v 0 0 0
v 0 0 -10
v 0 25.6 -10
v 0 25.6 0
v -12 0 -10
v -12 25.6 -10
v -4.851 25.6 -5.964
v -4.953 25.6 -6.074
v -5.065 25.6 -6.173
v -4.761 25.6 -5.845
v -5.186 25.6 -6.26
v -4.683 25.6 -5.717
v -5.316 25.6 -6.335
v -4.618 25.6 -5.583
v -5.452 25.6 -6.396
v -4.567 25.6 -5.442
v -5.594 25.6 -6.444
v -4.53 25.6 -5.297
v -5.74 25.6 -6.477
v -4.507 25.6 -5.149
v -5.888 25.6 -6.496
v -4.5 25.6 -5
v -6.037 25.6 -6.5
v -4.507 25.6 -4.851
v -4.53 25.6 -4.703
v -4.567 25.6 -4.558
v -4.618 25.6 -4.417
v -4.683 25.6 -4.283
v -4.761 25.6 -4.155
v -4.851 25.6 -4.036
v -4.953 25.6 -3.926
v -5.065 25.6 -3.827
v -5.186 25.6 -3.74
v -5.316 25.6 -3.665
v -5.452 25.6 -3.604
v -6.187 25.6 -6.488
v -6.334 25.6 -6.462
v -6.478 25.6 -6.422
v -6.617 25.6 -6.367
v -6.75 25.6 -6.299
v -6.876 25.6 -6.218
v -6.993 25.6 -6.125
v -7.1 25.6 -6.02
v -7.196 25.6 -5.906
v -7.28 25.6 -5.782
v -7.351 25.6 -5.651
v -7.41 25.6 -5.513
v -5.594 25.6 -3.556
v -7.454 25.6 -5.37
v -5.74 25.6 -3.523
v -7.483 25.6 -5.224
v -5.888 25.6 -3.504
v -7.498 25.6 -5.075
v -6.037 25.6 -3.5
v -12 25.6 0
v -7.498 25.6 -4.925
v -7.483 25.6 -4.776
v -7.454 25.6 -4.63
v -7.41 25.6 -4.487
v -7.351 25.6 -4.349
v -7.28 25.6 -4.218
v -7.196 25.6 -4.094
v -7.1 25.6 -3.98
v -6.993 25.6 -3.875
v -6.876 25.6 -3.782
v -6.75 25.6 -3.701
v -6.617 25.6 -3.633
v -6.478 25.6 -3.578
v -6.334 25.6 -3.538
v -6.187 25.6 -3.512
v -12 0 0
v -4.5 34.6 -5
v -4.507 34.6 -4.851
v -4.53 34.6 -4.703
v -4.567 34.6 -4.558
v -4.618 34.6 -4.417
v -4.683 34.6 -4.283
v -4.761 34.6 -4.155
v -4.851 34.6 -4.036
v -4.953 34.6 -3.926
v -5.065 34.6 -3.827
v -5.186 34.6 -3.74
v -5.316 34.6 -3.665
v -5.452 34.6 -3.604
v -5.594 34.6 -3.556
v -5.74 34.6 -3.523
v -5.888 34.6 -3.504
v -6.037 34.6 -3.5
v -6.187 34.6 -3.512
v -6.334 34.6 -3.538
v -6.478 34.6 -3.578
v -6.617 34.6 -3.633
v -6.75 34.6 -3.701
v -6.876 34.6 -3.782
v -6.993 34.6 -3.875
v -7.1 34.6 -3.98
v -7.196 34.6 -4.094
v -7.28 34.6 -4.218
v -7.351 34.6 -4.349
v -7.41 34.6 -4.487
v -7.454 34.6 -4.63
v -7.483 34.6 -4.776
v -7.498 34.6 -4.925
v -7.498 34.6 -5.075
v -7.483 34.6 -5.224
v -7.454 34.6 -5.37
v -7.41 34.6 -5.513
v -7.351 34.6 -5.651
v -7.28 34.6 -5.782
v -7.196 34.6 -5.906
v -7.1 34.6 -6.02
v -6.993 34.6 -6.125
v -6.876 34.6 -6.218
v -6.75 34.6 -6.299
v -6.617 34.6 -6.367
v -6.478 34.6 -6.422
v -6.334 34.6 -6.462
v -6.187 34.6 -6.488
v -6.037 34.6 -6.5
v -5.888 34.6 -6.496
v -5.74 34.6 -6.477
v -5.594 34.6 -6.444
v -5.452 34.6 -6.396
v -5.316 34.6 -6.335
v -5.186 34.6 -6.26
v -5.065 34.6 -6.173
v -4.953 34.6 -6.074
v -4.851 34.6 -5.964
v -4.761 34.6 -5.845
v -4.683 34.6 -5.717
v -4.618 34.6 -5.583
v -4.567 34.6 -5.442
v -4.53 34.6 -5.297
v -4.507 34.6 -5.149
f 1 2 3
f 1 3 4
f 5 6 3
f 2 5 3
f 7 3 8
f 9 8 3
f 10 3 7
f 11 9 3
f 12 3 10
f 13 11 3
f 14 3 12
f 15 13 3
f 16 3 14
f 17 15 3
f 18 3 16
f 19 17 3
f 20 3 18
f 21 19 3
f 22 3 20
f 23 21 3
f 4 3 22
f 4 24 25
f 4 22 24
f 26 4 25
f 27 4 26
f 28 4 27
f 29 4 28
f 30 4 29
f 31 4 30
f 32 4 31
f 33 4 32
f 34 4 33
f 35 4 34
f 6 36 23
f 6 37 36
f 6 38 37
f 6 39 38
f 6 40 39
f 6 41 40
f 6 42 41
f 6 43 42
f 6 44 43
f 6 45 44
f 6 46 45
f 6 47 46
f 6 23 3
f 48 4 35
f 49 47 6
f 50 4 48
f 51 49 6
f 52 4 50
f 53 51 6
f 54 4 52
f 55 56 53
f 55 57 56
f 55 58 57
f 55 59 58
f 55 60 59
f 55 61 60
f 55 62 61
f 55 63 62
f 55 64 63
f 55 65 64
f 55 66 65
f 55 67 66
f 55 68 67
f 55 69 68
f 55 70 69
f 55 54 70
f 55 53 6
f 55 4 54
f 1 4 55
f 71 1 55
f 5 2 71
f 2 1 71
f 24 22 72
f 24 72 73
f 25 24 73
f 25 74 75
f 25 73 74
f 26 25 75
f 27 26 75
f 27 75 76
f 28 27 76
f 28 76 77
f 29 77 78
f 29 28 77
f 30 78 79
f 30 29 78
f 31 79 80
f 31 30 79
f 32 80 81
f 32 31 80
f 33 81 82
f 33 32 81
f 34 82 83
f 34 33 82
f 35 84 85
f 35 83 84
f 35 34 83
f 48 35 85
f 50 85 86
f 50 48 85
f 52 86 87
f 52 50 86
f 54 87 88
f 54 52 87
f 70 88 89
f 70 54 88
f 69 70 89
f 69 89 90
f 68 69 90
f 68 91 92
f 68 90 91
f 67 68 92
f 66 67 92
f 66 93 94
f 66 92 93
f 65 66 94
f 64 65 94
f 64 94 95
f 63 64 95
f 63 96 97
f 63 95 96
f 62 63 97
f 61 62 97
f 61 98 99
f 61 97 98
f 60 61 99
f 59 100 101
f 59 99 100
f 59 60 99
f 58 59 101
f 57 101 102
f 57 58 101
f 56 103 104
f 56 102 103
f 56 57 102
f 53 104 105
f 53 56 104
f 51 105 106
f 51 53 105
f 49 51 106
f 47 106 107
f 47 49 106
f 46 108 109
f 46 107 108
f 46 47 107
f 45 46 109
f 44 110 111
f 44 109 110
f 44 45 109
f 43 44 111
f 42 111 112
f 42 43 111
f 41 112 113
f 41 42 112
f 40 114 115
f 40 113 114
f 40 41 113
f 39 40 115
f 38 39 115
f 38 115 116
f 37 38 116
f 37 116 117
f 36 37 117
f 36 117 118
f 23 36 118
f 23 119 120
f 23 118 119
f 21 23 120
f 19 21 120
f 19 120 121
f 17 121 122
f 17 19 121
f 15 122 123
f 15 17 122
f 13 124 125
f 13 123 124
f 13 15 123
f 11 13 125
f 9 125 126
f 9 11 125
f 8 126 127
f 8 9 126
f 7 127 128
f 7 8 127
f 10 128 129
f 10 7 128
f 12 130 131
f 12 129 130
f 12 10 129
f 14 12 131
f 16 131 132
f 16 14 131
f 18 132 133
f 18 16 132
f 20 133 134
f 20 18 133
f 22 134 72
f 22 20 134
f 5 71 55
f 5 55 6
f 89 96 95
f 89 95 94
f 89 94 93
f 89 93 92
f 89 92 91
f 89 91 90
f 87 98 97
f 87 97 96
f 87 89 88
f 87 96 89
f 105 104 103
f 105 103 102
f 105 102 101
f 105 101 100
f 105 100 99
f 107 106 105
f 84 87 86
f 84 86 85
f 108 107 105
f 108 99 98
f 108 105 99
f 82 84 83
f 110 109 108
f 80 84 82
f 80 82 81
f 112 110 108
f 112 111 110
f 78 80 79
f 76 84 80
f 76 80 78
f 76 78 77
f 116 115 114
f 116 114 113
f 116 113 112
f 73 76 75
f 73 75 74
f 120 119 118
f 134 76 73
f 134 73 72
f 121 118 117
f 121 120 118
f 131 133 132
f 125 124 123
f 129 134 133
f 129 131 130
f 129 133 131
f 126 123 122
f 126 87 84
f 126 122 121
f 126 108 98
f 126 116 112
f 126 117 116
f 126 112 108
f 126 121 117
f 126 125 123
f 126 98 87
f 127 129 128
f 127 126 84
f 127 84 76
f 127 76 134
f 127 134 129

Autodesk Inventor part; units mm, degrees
ref_plane "YZ Plane" through (0, 0, 0) normal (1, 0, 0) x (0, 1, 0)
ref_plane "XZ Plane" through (0, 0, 0) normal (0, 1, 0) x (-1, 0, 0)
ref_plane "XY Plane" through (0, 0, 0) normal (0, 0, 1) x (1, 0, 0)
sketch "Esquisse1" plane through (0, 0, 0) normal (0, 1, 0) x (-1, 0, 0)
  line L0 (0, 0) -> (12, 0)
  line L1 (12, 0) -> (12, -10)
  line L2 (12, -10) -> (0, -10)
  line L3 (0, -10) -> (0, 0)
  dimension "d0" = 10
  dimension "d1" = 12
extrude "Extrusion1" add sketch "Esquisse1" along normal blind 25.6
sketch "Esquisse2" plane through (0, 25.6, 0) normal (0, 1, 0) x (1, 0, 0)
  line L0 (-12, 0) -> (0, 0) construction
  line L1 (0, 0) -> (0, 10) construction
  line L2 (0, 10) -> (-12, 10) construction
  line L3 (-12, 10) -> (-12, 0) construction
  line L4 (-12, 5) -> (0, 5) construction
  line L5 (0, 0) -> (0, 10) construction
  circle A0 centre (-6, 5) radius 1.5
  dimension "d4" = 3
extrude "Extrusion2" add sketch "Esquisse2" along normal blind 9
properties part number "motor"
